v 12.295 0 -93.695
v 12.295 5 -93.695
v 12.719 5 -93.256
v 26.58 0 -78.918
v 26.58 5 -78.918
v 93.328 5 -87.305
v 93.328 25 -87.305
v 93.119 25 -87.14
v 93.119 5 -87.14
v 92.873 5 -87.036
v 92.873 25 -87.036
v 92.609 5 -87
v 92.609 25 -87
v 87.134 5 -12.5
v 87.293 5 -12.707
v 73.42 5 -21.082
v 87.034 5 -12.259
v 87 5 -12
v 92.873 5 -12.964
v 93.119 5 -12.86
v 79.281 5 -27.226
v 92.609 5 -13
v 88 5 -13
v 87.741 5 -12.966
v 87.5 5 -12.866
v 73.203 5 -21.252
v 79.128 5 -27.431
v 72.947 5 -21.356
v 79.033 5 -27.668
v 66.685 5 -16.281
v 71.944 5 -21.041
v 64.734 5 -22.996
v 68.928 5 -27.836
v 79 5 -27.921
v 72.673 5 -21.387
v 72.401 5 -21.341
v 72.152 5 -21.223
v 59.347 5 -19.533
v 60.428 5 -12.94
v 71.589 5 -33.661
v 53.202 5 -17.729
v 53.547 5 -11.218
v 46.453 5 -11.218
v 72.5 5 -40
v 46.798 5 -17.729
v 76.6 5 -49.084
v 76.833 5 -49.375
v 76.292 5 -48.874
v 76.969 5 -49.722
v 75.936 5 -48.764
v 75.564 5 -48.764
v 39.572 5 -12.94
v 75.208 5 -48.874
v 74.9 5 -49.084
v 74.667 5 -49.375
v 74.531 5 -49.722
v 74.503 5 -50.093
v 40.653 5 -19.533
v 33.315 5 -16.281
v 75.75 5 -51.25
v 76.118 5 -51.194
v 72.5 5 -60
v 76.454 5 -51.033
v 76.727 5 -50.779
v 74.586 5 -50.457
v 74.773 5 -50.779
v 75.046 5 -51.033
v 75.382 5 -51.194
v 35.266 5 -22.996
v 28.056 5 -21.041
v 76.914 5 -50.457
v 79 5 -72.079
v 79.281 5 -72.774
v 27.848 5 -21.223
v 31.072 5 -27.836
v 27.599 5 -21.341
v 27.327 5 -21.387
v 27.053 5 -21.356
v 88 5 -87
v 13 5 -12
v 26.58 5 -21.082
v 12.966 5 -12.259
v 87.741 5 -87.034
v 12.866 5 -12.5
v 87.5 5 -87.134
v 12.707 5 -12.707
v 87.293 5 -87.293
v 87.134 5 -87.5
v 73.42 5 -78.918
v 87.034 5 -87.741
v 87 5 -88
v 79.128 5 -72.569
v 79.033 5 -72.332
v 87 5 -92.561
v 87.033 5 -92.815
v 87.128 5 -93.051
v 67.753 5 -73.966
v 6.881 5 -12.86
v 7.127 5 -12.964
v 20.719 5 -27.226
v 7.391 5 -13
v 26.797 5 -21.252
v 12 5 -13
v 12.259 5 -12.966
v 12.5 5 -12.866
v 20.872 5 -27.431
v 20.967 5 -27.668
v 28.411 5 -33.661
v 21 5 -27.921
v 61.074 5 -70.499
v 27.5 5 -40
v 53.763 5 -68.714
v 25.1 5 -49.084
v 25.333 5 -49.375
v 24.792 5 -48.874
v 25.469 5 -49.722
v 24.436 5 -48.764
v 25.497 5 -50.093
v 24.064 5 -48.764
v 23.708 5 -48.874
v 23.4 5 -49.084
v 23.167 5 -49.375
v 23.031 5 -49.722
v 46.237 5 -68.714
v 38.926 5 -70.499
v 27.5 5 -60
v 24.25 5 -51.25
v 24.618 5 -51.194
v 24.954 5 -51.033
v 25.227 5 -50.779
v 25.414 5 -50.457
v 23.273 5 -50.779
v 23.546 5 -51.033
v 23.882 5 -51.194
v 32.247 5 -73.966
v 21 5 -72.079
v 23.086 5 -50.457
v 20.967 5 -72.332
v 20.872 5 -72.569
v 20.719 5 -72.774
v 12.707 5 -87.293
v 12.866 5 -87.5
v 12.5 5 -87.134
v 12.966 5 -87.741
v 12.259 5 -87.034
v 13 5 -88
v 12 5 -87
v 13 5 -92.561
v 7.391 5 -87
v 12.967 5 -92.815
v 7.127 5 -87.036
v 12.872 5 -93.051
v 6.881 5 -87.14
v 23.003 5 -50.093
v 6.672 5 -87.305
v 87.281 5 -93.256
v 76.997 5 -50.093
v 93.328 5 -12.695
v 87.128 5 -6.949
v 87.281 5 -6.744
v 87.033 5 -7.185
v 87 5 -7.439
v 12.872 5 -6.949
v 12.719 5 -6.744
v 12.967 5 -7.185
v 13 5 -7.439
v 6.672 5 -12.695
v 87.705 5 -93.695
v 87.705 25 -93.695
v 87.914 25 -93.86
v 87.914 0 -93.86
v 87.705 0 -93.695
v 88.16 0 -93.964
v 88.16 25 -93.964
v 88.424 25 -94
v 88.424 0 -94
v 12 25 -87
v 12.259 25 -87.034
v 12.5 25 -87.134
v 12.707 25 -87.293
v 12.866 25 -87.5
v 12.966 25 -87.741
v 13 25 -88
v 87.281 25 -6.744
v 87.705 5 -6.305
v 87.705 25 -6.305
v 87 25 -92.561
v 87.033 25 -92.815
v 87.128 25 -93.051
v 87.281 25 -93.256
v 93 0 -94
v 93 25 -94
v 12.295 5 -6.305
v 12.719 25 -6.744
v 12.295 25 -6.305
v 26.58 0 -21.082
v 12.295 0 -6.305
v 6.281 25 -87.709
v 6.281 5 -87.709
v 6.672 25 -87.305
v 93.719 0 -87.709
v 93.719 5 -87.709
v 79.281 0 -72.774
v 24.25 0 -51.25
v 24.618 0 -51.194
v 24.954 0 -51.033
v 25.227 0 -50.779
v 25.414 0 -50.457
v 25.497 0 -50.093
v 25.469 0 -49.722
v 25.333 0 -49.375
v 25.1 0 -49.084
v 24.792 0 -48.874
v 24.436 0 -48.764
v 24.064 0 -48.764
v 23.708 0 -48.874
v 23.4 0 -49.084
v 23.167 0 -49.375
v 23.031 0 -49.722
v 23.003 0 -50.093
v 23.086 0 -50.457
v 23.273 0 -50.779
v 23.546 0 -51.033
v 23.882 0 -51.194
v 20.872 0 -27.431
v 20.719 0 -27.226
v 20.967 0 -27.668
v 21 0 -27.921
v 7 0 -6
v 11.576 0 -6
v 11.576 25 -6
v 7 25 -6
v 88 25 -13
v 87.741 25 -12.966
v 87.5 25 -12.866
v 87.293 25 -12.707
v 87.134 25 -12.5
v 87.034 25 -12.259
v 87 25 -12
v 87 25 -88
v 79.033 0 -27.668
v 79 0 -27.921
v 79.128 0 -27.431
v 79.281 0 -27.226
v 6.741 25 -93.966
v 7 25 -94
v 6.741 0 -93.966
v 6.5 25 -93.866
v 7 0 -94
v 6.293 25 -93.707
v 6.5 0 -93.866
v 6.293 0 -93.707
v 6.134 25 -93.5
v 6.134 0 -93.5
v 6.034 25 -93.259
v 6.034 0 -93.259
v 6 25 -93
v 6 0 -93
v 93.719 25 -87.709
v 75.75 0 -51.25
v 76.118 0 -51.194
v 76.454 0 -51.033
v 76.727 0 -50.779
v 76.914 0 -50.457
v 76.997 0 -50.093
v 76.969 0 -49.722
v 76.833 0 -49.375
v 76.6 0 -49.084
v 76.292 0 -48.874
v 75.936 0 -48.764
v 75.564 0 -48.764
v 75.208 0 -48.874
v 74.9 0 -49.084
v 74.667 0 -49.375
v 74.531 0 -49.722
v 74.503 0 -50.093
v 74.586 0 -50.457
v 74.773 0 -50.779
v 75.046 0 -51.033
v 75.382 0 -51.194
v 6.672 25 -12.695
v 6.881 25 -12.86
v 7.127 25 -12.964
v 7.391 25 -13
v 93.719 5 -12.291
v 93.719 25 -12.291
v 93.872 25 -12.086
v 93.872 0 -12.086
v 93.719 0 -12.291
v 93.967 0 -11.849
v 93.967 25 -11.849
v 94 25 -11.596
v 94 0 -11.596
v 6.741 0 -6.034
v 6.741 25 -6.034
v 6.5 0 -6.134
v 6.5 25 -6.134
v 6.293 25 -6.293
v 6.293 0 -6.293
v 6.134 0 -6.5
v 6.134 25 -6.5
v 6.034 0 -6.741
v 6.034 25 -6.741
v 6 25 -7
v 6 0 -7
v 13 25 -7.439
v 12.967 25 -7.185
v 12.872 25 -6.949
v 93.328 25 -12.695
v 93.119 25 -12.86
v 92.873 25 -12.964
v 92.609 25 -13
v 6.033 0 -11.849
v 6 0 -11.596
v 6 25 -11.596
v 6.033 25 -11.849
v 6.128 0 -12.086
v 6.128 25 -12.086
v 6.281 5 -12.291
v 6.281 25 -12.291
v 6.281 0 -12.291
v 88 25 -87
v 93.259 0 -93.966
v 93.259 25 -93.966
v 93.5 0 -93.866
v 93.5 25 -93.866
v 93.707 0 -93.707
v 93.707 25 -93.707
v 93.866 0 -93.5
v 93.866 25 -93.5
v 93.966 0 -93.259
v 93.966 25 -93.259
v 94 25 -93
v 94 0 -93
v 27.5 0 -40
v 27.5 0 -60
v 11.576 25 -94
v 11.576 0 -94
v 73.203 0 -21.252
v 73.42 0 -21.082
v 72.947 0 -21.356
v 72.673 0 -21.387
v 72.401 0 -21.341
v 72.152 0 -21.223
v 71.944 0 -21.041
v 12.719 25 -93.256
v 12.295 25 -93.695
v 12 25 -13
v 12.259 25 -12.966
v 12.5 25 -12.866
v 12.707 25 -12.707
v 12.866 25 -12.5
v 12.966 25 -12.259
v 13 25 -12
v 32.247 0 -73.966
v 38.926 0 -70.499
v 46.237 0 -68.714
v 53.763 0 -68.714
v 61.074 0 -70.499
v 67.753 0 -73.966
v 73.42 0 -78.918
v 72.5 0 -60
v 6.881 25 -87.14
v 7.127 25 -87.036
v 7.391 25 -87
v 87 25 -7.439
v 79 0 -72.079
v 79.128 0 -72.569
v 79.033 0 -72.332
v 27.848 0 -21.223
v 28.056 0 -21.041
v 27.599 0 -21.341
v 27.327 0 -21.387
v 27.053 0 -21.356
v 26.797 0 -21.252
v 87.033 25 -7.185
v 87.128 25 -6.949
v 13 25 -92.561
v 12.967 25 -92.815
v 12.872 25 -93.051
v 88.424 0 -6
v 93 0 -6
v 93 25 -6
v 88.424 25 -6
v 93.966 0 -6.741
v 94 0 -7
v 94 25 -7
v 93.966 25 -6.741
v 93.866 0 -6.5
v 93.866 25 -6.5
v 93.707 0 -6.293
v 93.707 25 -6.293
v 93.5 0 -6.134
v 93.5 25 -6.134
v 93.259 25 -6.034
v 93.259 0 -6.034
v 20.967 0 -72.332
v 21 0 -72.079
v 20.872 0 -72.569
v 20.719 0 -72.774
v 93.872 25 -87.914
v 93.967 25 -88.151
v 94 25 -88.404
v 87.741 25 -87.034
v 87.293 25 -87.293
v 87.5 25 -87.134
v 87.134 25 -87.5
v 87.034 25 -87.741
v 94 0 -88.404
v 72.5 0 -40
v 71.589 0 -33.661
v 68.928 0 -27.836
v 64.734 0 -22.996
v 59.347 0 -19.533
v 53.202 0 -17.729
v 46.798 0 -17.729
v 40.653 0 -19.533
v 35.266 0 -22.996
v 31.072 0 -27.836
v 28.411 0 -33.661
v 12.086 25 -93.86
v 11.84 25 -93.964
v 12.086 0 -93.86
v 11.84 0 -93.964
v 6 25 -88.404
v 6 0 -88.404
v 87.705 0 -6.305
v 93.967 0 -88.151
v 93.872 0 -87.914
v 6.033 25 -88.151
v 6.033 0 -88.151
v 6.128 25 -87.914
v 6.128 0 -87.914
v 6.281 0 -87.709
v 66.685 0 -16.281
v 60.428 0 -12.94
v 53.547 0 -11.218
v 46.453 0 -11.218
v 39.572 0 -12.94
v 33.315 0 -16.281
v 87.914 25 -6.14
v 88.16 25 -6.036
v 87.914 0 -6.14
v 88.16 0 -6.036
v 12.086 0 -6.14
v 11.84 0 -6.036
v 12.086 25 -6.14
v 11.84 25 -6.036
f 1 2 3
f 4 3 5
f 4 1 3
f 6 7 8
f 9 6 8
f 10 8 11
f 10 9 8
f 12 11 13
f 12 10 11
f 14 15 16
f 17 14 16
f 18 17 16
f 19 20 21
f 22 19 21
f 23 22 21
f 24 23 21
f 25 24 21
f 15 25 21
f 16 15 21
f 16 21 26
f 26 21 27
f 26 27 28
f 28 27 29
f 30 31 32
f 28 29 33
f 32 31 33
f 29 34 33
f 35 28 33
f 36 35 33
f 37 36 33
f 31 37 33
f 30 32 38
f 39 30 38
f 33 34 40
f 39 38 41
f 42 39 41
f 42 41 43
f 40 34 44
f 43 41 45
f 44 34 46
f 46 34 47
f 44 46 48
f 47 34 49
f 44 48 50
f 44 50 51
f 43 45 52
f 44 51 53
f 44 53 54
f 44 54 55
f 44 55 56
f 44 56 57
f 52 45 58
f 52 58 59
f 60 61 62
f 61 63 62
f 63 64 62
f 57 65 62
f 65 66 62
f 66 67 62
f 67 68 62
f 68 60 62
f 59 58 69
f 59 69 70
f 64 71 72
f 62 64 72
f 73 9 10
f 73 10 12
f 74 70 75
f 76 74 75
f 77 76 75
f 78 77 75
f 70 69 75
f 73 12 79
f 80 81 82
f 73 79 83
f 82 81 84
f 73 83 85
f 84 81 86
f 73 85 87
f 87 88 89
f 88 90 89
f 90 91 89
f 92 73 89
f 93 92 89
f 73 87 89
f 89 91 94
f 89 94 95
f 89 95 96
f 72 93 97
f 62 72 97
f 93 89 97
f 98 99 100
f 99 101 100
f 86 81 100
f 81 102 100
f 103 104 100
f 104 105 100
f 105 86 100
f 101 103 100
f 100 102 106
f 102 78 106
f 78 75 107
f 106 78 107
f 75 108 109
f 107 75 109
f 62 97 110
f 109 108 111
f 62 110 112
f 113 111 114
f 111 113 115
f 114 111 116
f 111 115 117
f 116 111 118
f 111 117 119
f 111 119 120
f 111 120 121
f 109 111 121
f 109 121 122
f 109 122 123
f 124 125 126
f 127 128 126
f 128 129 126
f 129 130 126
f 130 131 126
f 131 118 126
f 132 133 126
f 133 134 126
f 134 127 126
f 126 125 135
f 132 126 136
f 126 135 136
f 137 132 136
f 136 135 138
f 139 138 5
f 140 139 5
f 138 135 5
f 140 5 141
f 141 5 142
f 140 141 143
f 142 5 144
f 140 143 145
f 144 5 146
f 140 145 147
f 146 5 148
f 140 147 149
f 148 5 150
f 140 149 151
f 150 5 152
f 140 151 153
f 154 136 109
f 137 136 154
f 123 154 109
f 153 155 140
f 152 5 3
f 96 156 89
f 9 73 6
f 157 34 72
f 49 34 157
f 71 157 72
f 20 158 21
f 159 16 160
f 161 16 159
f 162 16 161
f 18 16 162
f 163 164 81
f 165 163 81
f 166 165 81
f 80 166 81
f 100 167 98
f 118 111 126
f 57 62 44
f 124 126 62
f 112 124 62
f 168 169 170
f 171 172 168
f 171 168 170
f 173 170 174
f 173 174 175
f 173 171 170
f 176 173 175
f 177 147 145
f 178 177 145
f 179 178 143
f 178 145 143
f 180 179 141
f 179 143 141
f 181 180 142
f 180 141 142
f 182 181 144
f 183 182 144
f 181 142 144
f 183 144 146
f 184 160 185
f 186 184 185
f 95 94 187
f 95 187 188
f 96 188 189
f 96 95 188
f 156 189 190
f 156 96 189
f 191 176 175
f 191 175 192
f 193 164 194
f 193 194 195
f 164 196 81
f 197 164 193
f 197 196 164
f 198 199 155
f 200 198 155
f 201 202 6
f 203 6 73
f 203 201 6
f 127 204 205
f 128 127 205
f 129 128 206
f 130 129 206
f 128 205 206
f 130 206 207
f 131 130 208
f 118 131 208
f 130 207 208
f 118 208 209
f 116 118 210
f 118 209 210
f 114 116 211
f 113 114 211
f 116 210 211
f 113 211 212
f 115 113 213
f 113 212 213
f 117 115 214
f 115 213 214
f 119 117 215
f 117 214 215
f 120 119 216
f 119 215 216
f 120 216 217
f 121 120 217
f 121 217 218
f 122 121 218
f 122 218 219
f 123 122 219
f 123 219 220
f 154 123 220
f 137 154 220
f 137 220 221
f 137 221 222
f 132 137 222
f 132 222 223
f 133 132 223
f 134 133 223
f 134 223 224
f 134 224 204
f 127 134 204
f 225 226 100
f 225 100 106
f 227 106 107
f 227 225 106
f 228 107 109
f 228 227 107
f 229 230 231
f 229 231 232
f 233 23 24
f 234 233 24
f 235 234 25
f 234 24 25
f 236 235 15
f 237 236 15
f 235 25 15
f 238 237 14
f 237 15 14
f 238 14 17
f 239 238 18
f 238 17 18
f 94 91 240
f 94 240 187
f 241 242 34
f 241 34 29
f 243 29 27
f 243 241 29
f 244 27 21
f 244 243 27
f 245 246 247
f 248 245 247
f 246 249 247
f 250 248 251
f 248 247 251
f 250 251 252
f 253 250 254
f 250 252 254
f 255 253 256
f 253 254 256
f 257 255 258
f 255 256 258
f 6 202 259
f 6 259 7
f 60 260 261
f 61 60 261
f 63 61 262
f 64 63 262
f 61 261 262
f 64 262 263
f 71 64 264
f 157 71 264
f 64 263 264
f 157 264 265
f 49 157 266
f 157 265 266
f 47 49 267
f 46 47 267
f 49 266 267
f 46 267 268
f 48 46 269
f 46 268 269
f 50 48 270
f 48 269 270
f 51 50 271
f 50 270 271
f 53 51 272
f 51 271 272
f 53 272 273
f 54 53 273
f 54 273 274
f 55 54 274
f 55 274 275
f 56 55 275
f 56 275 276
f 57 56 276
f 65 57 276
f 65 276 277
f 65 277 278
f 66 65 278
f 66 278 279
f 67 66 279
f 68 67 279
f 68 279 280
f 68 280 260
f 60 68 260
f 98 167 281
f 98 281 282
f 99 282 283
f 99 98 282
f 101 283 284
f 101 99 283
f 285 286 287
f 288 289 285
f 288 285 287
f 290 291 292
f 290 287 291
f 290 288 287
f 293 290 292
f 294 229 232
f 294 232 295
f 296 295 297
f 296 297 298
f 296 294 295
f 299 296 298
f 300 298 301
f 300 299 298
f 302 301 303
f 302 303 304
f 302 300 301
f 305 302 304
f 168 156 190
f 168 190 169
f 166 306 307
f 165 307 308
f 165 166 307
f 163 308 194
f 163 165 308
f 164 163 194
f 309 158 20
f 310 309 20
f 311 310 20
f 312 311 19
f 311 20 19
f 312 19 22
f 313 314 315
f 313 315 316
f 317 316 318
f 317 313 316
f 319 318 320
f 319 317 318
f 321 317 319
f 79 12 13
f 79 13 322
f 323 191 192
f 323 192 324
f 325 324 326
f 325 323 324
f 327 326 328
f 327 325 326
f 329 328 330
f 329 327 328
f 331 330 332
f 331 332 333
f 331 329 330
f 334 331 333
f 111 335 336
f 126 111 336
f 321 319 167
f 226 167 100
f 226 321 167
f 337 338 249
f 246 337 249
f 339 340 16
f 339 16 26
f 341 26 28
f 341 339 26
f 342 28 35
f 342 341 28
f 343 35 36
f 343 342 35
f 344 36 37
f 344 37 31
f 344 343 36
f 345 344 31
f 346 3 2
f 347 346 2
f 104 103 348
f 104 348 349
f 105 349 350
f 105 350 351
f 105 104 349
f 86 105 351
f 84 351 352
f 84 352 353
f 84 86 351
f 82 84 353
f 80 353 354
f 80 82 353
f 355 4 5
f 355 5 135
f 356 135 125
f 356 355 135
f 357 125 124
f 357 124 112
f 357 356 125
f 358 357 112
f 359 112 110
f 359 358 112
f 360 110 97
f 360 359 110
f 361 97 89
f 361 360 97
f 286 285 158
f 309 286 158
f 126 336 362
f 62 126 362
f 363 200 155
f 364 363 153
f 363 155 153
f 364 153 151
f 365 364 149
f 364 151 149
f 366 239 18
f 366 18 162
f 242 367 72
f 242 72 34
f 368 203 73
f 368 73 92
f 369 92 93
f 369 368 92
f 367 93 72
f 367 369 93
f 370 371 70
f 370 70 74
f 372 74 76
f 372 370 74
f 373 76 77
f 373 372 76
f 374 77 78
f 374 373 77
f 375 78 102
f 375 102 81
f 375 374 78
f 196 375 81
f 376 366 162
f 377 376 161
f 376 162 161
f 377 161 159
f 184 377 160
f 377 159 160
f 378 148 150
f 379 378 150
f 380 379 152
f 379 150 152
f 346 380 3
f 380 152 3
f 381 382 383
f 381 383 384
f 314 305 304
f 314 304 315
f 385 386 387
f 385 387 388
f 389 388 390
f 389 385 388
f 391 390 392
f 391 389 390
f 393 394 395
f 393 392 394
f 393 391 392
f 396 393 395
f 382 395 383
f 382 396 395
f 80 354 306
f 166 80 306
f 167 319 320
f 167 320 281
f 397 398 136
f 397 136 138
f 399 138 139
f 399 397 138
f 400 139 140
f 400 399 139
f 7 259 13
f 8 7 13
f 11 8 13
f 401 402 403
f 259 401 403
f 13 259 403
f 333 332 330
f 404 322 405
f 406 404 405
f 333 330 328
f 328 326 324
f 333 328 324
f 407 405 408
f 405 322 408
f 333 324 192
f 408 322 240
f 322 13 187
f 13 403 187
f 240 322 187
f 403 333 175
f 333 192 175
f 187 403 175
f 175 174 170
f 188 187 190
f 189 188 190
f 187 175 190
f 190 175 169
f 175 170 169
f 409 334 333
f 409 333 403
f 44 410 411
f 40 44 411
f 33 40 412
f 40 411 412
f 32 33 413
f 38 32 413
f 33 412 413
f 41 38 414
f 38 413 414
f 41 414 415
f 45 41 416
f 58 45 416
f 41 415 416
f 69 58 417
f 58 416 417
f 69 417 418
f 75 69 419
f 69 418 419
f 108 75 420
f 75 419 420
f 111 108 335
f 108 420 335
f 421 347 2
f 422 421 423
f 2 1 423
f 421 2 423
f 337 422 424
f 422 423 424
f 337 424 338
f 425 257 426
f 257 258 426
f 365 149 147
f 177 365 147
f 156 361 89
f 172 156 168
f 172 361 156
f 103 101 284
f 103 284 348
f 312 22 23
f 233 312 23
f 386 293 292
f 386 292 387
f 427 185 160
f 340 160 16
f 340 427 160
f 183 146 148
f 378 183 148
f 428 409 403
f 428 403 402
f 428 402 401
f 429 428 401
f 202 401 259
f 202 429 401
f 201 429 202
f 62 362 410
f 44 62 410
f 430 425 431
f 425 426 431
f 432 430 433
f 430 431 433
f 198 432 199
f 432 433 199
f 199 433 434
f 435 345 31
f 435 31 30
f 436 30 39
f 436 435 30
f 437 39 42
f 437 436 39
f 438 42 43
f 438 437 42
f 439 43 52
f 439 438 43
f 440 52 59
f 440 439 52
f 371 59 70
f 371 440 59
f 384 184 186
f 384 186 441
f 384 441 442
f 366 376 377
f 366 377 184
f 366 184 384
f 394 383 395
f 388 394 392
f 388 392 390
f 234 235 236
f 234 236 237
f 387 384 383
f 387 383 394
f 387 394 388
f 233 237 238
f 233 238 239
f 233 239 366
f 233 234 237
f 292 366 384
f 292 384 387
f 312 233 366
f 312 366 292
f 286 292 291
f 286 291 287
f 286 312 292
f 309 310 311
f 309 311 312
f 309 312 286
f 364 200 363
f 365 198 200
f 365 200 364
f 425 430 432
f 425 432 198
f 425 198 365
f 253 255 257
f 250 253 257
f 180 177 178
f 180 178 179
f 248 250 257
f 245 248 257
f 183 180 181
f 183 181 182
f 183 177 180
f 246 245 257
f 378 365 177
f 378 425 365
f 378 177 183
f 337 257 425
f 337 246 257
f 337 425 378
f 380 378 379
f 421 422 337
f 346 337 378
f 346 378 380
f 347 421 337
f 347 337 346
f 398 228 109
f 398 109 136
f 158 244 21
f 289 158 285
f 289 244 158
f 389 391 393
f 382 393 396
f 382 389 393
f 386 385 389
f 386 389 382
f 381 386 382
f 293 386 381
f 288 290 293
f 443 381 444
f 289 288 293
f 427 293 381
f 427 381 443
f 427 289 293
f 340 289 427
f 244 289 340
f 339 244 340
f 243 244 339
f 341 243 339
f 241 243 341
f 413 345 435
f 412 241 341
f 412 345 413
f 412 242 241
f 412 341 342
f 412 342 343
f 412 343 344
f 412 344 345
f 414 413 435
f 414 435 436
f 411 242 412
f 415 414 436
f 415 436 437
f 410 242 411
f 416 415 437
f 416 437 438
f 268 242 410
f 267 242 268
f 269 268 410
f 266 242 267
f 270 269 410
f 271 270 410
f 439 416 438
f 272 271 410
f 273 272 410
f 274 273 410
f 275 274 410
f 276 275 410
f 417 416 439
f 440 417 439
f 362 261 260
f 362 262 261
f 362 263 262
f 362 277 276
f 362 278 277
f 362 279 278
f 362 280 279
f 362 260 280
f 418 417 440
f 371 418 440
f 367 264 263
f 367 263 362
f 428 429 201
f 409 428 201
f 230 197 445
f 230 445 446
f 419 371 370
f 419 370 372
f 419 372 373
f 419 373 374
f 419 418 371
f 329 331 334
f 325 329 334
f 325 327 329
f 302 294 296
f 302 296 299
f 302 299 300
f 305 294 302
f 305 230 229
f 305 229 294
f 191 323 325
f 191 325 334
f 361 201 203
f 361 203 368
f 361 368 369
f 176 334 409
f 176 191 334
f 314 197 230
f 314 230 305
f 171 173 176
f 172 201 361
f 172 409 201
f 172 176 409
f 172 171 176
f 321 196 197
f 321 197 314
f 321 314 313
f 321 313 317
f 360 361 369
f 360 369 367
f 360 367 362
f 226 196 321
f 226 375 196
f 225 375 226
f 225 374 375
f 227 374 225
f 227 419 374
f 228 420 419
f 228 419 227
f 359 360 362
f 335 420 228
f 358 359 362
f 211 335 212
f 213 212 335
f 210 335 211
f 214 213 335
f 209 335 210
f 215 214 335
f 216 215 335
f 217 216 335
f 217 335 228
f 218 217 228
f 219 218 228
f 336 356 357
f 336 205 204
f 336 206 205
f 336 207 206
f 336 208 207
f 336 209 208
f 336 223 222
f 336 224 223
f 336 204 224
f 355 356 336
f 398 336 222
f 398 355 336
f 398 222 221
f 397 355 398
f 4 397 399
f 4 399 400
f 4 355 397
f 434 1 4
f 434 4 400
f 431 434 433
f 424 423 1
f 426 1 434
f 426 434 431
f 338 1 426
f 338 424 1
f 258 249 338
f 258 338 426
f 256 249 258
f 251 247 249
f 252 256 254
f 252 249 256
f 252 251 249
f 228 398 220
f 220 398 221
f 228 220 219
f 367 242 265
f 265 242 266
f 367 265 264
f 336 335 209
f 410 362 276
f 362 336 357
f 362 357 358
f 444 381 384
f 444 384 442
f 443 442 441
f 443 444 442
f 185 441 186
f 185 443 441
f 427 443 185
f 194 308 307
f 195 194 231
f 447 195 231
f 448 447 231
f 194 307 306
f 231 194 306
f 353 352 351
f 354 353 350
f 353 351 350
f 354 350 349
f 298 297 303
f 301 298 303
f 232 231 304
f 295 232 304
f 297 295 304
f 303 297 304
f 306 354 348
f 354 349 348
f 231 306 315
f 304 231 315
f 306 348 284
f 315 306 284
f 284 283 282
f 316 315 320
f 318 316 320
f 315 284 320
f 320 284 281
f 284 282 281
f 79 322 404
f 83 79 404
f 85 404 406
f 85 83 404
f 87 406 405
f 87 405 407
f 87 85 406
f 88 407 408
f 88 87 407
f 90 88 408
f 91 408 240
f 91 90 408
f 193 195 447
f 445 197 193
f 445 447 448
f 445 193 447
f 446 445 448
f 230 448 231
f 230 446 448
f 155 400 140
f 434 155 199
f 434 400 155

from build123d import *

# Parameters (mm, degrees)
BOSS_EXTRUDE1_DEPTH             = 5
BOSS_EXTRUDE2_DEPTH             = 20
TAP_DRILL_FOR_M3X0_5_TAP1_D     = 2.5
TAP_DRILL_FOR_M3X0_5_TAP1_DEPTH = 6
TAP_DRILL_FOR_M3X0_5_TAP1_TIP   = 0.751075774


with BuildPart() as part:
    # Sketch1 → Boss-Extrude1 (new body)
    with BuildSketch(Plane(origin=(0, 0, 0), x_dir=(1, 0, 0), z_dir=(0, 1, 0))):
        with BuildLine():
            Line((21, 27.921142965), (21, 72.078857035))
            ThreePointArc((21, 72.078857035), (20.927086518, 72.453704455), (20.718978822, 72.773889015))
            Line((20.718978822, 72.773889015), (6.281021178, 87.709296434))
            ThreePointArc((6.281021178, 87.709296434), (6.072913482, 88.029480993), (6, 88.404328413))
            Line((6, 88.404328413), (6, 93))
            ThreePointArc((6, 93), (6.292893219, 93.707106781), (7, 94))
            Line((7, 94), (11.575831706, 94))
            ThreePointArc((11.575831706, 94), (11.966323717, 93.920606316), (12.294810529, 93.69503198))
            Line((12.294810529, 93.69503198), (26.579929079, 78.91772962))
            ThreePointArc((26.579929079, 78.91772962), (50, 68.488702878), (73.420070921, 78.91772962))
            Line((73.420070921, 78.91772962), (87.705189471, 93.69503198))
            ThreePointArc((87.705189471, 93.69503198), (88.033676283, 93.920606316), (88.424168294, 94))
            Line((88.424168294, 94), (93, 94))
            ThreePointArc((93, 94), (93.707106781, 93.707106781), (94, 93))
            Line((94, 93), (94, 88.404328413))
            ThreePointArc((94, 88.404328413), (93.927086518, 88.029480993), (93.718978822, 87.709296434))
            Line((93.718978822, 87.709296434), (79.281021178, 72.773889015))
            ThreePointArc((79.281021178, 72.773889015), (79.072913482, 72.453704455), (79, 72.078857035))
            Line((79, 72.078857035), (79, 27.921142965))
            ThreePointArc((79, 27.921142965), (79.072913482, 27.546295545), (79.281021178, 27.226110985))
            Line((79.281021178, 27.226110985), (93.718978822, 12.290703566))
            ThreePointArc((93.718978822, 12.290703566), (93.927086518, 11.970519007), (94, 11.595671587))
            Line((94, 11.595671587), (94, 7))
            ThreePointArc((94, 7), (93.707106781, 6.292893219), (93, 6))
            Line((93, 6), (88.424168294, 6))
            ThreePointArc((88.424168294, 6), (88.033676283, 6.079393684), (87.705189471, 6.30496802))
            Line((87.705189471, 6.30496802), (73.420070921, 21.08227038))
            ThreePointArc((73.420070921, 21.08227038), (72.67313409, 21.386847499), (71.944389028, 21.040997121))
            ThreePointArc((71.944389028, 21.040997121), (50, 11), (28.055610972, 21.040997121))
            ThreePointArc((28.055610972, 21.040997121), (27.32686591, 21.386847499), (26.579929079, 21.08227038))
            Line((26.579929079, 21.08227038), (12.294810529, 6.30496802))
            ThreePointArc((12.294810529, 6.30496802), (11.966323717, 6.079393684), (11.575831706, 6))
            Line((11.575831706, 6), (7, 6))
            ThreePointArc((7, 6), (6.292893219, 6.292893219), (6, 7))
            Line((6, 7), (6, 11.595671587))
            ThreePointArc((6, 11.595671587), (6.072913482, 11.970519007), (6.281021178, 12.290703566))
            Line((6.281021178, 12.290703566), (20.718978822, 27.226110985))
            ThreePointArc((20.718978822, 27.226110985), (20.927086518, 27.546295545), (21, 27.921142965))
        make_face()
        with BuildLine():
            Line((27.5, 40), (27.5, 60))
            Line((27.5, 60), (72.5, 60))
            Line((72.5, 60), (72.5, 40))
            ThreePointArc((72.5, 40), (50, 17.5), (27.5, 40))
        make_face(mode=Mode.SUBTRACT)
    extrude(amount=BOSS_EXTRUDE1_DEPTH)

    # Sketch2 → Boss-Extrude2 (add)
    with BuildSketch(Plane(origin=(0, 5, 0), x_dir=(1, 0, 0), z_dir=(0, 1, 0))):
        with BuildLine():
            Line((11.575831706, 94), (7, 94))
            ThreePointArc((7, 94), (6.292893219, 93.707106781), (6, 93))
            Line((6, 93), (6, 88.404328413))
            ThreePointArc((6, 88.404328413), (6.072913482, 88.029480993), (6.281021178, 87.709296434))
            Line((6.281021178, 87.709296434), (6.671882728, 87.30496802))
            ThreePointArc((6.671882728, 87.30496802), (7.00036954, 87.079393684), (7.390861551, 87))
            Line((7.390861551, 87), (12, 87))
            ThreePointArc((12, 87), (12.707106781, 87.292893219), (13, 88))
            Line((13, 88), (13, 92.561217283))
            ThreePointArc((13, 92.561217283), (12.927086518, 92.936064704), (12.718978822, 93.256249263))
            Line((12.718978822, 93.256249263), (12.294810529, 93.69503198))
            ThreePointArc((12.294810529, 93.69503198), (11.966323717, 93.920606316), (11.575831706, 94))
        make_face()
        with BuildLine():
            Line((87, 88), (87, 92.561217283))
            ThreePointArc((87, 92.561217283), (87.072913482, 92.936064704), (87.281021178, 93.256249263))
            Line((87.281021178, 93.256249263), (87.705189471, 93.69503198))
            ThreePointArc((87.705189471, 93.69503198), (88.033676283, 93.920606316), (88.424168294, 94))
            Line((88.424168294, 94), (93, 94))
            ThreePointArc((93, 94), (93.707106781, 93.707106781), (94, 93))
            Line((94, 93), (94, 88.404328413))
            ThreePointArc((94, 88.404328413), (93.927086518, 88.029480993), (93.718978822, 87.709296434))
            Line((93.718978822, 87.709296434), (93.328117272, 87.30496802))
            ThreePointArc((93.328117272, 87.30496802), (92.99963046, 87.079393684), (92.609138449, 87))
            Line((92.609138449, 87), (88, 87))
            ThreePointArc((88, 87), (87.292893219, 87.292893219), (87, 88))
        make_face()
        with BuildLine():
            Line((88.424168294, 6), (93, 6))
            ThreePointArc((93, 6), (93.707106781, 6.292893219), (94, 7))
            Line((94, 7), (94, 11.595671587))
            ThreePointArc((94, 11.595671587), (93.927086518, 11.970519007), (93.718978822, 12.290703566))
            Line((93.718978822, 12.290703566), (93.328117272, 12.69503198))
            ThreePointArc((93.328117272, 12.69503198), (92.99963046, 12.920606316), (92.609138449, 13))
            Line((92.609138449, 13), (88, 13))
            ThreePointArc((88, 13), (87.292893219, 12.707106781), (87, 12))
            Line((87, 12), (87, 7.438782717))
            ThreePointArc((87, 7.438782717), (87.072913482, 7.063935296), (87.281021178, 6.743750737))
            Line((87.281021178, 6.743750737), (87.705189471, 6.30496802))
            ThreePointArc((87.705189471, 6.30496802), (88.033676283, 6.079393684), (88.424168294, 6))
        make_face()
        with BuildLine():
            Line((13, 12), (13, 7.438782717))
            ThreePointArc((13, 7.438782717), (12.927086518, 7.063935296), (12.718978822, 6.743750737))
            Line((12.718978822, 6.743750737), (12.294810529, 6.30496802))
            ThreePointArc((12.294810529, 6.30496802), (11.966323717, 6.079393684), (11.575831706, 6))
            Line((11.575831706, 6), (7, 6))
            ThreePointArc((7, 6), (6.292893219, 6.292893219), (6, 7))
            Line((6, 7), (6, 11.595671587))
            ThreePointArc((6, 11.595671587), (6.072913482, 11.970519007), (6.281021178, 12.290703566))
            Line((6.281021178, 12.290703566), (6.671882728, 12.69503198))
            ThreePointArc((6.671882728, 12.69503198), (7.00036954, 12.920606316), (7.390861551, 13))
            Line((7.390861551, 13), (12, 13))
            ThreePointArc((12, 13), (12.707106781, 12.707106781), (13, 12))
        make_face()
    extrude(amount=BOSS_EXTRUDE2_DEPTH)

    # Tap Drill for M3x0.5 Tap1
    with Locations(Plane(origin=(24.25, 5, -50), x_dir=(0, 0, 1), z_dir=(0, 1, 0))):
        with Locations((0, 0), (0, 51.5)):
            Hole(TAP_DRILL_FOR_M3X0_5_TAP1_D / 2, depth=TAP_DRILL_FOR_M3X0_5_TAP1_DEPTH)
            with Locations((0, 0, -(TAP_DRILL_FOR_M3X0_5_TAP1_DEPTH + TAP_DRILL_FOR_M3X0_5_TAP1_TIP / 2))):  # 118° drill point
                Cone(0, TAP_DRILL_FOR_M3X0_5_TAP1_D / 2, TAP_DRILL_FOR_M3X0_5_TAP1_TIP, mode=Mode.SUBTRACT)


solid = part.part
